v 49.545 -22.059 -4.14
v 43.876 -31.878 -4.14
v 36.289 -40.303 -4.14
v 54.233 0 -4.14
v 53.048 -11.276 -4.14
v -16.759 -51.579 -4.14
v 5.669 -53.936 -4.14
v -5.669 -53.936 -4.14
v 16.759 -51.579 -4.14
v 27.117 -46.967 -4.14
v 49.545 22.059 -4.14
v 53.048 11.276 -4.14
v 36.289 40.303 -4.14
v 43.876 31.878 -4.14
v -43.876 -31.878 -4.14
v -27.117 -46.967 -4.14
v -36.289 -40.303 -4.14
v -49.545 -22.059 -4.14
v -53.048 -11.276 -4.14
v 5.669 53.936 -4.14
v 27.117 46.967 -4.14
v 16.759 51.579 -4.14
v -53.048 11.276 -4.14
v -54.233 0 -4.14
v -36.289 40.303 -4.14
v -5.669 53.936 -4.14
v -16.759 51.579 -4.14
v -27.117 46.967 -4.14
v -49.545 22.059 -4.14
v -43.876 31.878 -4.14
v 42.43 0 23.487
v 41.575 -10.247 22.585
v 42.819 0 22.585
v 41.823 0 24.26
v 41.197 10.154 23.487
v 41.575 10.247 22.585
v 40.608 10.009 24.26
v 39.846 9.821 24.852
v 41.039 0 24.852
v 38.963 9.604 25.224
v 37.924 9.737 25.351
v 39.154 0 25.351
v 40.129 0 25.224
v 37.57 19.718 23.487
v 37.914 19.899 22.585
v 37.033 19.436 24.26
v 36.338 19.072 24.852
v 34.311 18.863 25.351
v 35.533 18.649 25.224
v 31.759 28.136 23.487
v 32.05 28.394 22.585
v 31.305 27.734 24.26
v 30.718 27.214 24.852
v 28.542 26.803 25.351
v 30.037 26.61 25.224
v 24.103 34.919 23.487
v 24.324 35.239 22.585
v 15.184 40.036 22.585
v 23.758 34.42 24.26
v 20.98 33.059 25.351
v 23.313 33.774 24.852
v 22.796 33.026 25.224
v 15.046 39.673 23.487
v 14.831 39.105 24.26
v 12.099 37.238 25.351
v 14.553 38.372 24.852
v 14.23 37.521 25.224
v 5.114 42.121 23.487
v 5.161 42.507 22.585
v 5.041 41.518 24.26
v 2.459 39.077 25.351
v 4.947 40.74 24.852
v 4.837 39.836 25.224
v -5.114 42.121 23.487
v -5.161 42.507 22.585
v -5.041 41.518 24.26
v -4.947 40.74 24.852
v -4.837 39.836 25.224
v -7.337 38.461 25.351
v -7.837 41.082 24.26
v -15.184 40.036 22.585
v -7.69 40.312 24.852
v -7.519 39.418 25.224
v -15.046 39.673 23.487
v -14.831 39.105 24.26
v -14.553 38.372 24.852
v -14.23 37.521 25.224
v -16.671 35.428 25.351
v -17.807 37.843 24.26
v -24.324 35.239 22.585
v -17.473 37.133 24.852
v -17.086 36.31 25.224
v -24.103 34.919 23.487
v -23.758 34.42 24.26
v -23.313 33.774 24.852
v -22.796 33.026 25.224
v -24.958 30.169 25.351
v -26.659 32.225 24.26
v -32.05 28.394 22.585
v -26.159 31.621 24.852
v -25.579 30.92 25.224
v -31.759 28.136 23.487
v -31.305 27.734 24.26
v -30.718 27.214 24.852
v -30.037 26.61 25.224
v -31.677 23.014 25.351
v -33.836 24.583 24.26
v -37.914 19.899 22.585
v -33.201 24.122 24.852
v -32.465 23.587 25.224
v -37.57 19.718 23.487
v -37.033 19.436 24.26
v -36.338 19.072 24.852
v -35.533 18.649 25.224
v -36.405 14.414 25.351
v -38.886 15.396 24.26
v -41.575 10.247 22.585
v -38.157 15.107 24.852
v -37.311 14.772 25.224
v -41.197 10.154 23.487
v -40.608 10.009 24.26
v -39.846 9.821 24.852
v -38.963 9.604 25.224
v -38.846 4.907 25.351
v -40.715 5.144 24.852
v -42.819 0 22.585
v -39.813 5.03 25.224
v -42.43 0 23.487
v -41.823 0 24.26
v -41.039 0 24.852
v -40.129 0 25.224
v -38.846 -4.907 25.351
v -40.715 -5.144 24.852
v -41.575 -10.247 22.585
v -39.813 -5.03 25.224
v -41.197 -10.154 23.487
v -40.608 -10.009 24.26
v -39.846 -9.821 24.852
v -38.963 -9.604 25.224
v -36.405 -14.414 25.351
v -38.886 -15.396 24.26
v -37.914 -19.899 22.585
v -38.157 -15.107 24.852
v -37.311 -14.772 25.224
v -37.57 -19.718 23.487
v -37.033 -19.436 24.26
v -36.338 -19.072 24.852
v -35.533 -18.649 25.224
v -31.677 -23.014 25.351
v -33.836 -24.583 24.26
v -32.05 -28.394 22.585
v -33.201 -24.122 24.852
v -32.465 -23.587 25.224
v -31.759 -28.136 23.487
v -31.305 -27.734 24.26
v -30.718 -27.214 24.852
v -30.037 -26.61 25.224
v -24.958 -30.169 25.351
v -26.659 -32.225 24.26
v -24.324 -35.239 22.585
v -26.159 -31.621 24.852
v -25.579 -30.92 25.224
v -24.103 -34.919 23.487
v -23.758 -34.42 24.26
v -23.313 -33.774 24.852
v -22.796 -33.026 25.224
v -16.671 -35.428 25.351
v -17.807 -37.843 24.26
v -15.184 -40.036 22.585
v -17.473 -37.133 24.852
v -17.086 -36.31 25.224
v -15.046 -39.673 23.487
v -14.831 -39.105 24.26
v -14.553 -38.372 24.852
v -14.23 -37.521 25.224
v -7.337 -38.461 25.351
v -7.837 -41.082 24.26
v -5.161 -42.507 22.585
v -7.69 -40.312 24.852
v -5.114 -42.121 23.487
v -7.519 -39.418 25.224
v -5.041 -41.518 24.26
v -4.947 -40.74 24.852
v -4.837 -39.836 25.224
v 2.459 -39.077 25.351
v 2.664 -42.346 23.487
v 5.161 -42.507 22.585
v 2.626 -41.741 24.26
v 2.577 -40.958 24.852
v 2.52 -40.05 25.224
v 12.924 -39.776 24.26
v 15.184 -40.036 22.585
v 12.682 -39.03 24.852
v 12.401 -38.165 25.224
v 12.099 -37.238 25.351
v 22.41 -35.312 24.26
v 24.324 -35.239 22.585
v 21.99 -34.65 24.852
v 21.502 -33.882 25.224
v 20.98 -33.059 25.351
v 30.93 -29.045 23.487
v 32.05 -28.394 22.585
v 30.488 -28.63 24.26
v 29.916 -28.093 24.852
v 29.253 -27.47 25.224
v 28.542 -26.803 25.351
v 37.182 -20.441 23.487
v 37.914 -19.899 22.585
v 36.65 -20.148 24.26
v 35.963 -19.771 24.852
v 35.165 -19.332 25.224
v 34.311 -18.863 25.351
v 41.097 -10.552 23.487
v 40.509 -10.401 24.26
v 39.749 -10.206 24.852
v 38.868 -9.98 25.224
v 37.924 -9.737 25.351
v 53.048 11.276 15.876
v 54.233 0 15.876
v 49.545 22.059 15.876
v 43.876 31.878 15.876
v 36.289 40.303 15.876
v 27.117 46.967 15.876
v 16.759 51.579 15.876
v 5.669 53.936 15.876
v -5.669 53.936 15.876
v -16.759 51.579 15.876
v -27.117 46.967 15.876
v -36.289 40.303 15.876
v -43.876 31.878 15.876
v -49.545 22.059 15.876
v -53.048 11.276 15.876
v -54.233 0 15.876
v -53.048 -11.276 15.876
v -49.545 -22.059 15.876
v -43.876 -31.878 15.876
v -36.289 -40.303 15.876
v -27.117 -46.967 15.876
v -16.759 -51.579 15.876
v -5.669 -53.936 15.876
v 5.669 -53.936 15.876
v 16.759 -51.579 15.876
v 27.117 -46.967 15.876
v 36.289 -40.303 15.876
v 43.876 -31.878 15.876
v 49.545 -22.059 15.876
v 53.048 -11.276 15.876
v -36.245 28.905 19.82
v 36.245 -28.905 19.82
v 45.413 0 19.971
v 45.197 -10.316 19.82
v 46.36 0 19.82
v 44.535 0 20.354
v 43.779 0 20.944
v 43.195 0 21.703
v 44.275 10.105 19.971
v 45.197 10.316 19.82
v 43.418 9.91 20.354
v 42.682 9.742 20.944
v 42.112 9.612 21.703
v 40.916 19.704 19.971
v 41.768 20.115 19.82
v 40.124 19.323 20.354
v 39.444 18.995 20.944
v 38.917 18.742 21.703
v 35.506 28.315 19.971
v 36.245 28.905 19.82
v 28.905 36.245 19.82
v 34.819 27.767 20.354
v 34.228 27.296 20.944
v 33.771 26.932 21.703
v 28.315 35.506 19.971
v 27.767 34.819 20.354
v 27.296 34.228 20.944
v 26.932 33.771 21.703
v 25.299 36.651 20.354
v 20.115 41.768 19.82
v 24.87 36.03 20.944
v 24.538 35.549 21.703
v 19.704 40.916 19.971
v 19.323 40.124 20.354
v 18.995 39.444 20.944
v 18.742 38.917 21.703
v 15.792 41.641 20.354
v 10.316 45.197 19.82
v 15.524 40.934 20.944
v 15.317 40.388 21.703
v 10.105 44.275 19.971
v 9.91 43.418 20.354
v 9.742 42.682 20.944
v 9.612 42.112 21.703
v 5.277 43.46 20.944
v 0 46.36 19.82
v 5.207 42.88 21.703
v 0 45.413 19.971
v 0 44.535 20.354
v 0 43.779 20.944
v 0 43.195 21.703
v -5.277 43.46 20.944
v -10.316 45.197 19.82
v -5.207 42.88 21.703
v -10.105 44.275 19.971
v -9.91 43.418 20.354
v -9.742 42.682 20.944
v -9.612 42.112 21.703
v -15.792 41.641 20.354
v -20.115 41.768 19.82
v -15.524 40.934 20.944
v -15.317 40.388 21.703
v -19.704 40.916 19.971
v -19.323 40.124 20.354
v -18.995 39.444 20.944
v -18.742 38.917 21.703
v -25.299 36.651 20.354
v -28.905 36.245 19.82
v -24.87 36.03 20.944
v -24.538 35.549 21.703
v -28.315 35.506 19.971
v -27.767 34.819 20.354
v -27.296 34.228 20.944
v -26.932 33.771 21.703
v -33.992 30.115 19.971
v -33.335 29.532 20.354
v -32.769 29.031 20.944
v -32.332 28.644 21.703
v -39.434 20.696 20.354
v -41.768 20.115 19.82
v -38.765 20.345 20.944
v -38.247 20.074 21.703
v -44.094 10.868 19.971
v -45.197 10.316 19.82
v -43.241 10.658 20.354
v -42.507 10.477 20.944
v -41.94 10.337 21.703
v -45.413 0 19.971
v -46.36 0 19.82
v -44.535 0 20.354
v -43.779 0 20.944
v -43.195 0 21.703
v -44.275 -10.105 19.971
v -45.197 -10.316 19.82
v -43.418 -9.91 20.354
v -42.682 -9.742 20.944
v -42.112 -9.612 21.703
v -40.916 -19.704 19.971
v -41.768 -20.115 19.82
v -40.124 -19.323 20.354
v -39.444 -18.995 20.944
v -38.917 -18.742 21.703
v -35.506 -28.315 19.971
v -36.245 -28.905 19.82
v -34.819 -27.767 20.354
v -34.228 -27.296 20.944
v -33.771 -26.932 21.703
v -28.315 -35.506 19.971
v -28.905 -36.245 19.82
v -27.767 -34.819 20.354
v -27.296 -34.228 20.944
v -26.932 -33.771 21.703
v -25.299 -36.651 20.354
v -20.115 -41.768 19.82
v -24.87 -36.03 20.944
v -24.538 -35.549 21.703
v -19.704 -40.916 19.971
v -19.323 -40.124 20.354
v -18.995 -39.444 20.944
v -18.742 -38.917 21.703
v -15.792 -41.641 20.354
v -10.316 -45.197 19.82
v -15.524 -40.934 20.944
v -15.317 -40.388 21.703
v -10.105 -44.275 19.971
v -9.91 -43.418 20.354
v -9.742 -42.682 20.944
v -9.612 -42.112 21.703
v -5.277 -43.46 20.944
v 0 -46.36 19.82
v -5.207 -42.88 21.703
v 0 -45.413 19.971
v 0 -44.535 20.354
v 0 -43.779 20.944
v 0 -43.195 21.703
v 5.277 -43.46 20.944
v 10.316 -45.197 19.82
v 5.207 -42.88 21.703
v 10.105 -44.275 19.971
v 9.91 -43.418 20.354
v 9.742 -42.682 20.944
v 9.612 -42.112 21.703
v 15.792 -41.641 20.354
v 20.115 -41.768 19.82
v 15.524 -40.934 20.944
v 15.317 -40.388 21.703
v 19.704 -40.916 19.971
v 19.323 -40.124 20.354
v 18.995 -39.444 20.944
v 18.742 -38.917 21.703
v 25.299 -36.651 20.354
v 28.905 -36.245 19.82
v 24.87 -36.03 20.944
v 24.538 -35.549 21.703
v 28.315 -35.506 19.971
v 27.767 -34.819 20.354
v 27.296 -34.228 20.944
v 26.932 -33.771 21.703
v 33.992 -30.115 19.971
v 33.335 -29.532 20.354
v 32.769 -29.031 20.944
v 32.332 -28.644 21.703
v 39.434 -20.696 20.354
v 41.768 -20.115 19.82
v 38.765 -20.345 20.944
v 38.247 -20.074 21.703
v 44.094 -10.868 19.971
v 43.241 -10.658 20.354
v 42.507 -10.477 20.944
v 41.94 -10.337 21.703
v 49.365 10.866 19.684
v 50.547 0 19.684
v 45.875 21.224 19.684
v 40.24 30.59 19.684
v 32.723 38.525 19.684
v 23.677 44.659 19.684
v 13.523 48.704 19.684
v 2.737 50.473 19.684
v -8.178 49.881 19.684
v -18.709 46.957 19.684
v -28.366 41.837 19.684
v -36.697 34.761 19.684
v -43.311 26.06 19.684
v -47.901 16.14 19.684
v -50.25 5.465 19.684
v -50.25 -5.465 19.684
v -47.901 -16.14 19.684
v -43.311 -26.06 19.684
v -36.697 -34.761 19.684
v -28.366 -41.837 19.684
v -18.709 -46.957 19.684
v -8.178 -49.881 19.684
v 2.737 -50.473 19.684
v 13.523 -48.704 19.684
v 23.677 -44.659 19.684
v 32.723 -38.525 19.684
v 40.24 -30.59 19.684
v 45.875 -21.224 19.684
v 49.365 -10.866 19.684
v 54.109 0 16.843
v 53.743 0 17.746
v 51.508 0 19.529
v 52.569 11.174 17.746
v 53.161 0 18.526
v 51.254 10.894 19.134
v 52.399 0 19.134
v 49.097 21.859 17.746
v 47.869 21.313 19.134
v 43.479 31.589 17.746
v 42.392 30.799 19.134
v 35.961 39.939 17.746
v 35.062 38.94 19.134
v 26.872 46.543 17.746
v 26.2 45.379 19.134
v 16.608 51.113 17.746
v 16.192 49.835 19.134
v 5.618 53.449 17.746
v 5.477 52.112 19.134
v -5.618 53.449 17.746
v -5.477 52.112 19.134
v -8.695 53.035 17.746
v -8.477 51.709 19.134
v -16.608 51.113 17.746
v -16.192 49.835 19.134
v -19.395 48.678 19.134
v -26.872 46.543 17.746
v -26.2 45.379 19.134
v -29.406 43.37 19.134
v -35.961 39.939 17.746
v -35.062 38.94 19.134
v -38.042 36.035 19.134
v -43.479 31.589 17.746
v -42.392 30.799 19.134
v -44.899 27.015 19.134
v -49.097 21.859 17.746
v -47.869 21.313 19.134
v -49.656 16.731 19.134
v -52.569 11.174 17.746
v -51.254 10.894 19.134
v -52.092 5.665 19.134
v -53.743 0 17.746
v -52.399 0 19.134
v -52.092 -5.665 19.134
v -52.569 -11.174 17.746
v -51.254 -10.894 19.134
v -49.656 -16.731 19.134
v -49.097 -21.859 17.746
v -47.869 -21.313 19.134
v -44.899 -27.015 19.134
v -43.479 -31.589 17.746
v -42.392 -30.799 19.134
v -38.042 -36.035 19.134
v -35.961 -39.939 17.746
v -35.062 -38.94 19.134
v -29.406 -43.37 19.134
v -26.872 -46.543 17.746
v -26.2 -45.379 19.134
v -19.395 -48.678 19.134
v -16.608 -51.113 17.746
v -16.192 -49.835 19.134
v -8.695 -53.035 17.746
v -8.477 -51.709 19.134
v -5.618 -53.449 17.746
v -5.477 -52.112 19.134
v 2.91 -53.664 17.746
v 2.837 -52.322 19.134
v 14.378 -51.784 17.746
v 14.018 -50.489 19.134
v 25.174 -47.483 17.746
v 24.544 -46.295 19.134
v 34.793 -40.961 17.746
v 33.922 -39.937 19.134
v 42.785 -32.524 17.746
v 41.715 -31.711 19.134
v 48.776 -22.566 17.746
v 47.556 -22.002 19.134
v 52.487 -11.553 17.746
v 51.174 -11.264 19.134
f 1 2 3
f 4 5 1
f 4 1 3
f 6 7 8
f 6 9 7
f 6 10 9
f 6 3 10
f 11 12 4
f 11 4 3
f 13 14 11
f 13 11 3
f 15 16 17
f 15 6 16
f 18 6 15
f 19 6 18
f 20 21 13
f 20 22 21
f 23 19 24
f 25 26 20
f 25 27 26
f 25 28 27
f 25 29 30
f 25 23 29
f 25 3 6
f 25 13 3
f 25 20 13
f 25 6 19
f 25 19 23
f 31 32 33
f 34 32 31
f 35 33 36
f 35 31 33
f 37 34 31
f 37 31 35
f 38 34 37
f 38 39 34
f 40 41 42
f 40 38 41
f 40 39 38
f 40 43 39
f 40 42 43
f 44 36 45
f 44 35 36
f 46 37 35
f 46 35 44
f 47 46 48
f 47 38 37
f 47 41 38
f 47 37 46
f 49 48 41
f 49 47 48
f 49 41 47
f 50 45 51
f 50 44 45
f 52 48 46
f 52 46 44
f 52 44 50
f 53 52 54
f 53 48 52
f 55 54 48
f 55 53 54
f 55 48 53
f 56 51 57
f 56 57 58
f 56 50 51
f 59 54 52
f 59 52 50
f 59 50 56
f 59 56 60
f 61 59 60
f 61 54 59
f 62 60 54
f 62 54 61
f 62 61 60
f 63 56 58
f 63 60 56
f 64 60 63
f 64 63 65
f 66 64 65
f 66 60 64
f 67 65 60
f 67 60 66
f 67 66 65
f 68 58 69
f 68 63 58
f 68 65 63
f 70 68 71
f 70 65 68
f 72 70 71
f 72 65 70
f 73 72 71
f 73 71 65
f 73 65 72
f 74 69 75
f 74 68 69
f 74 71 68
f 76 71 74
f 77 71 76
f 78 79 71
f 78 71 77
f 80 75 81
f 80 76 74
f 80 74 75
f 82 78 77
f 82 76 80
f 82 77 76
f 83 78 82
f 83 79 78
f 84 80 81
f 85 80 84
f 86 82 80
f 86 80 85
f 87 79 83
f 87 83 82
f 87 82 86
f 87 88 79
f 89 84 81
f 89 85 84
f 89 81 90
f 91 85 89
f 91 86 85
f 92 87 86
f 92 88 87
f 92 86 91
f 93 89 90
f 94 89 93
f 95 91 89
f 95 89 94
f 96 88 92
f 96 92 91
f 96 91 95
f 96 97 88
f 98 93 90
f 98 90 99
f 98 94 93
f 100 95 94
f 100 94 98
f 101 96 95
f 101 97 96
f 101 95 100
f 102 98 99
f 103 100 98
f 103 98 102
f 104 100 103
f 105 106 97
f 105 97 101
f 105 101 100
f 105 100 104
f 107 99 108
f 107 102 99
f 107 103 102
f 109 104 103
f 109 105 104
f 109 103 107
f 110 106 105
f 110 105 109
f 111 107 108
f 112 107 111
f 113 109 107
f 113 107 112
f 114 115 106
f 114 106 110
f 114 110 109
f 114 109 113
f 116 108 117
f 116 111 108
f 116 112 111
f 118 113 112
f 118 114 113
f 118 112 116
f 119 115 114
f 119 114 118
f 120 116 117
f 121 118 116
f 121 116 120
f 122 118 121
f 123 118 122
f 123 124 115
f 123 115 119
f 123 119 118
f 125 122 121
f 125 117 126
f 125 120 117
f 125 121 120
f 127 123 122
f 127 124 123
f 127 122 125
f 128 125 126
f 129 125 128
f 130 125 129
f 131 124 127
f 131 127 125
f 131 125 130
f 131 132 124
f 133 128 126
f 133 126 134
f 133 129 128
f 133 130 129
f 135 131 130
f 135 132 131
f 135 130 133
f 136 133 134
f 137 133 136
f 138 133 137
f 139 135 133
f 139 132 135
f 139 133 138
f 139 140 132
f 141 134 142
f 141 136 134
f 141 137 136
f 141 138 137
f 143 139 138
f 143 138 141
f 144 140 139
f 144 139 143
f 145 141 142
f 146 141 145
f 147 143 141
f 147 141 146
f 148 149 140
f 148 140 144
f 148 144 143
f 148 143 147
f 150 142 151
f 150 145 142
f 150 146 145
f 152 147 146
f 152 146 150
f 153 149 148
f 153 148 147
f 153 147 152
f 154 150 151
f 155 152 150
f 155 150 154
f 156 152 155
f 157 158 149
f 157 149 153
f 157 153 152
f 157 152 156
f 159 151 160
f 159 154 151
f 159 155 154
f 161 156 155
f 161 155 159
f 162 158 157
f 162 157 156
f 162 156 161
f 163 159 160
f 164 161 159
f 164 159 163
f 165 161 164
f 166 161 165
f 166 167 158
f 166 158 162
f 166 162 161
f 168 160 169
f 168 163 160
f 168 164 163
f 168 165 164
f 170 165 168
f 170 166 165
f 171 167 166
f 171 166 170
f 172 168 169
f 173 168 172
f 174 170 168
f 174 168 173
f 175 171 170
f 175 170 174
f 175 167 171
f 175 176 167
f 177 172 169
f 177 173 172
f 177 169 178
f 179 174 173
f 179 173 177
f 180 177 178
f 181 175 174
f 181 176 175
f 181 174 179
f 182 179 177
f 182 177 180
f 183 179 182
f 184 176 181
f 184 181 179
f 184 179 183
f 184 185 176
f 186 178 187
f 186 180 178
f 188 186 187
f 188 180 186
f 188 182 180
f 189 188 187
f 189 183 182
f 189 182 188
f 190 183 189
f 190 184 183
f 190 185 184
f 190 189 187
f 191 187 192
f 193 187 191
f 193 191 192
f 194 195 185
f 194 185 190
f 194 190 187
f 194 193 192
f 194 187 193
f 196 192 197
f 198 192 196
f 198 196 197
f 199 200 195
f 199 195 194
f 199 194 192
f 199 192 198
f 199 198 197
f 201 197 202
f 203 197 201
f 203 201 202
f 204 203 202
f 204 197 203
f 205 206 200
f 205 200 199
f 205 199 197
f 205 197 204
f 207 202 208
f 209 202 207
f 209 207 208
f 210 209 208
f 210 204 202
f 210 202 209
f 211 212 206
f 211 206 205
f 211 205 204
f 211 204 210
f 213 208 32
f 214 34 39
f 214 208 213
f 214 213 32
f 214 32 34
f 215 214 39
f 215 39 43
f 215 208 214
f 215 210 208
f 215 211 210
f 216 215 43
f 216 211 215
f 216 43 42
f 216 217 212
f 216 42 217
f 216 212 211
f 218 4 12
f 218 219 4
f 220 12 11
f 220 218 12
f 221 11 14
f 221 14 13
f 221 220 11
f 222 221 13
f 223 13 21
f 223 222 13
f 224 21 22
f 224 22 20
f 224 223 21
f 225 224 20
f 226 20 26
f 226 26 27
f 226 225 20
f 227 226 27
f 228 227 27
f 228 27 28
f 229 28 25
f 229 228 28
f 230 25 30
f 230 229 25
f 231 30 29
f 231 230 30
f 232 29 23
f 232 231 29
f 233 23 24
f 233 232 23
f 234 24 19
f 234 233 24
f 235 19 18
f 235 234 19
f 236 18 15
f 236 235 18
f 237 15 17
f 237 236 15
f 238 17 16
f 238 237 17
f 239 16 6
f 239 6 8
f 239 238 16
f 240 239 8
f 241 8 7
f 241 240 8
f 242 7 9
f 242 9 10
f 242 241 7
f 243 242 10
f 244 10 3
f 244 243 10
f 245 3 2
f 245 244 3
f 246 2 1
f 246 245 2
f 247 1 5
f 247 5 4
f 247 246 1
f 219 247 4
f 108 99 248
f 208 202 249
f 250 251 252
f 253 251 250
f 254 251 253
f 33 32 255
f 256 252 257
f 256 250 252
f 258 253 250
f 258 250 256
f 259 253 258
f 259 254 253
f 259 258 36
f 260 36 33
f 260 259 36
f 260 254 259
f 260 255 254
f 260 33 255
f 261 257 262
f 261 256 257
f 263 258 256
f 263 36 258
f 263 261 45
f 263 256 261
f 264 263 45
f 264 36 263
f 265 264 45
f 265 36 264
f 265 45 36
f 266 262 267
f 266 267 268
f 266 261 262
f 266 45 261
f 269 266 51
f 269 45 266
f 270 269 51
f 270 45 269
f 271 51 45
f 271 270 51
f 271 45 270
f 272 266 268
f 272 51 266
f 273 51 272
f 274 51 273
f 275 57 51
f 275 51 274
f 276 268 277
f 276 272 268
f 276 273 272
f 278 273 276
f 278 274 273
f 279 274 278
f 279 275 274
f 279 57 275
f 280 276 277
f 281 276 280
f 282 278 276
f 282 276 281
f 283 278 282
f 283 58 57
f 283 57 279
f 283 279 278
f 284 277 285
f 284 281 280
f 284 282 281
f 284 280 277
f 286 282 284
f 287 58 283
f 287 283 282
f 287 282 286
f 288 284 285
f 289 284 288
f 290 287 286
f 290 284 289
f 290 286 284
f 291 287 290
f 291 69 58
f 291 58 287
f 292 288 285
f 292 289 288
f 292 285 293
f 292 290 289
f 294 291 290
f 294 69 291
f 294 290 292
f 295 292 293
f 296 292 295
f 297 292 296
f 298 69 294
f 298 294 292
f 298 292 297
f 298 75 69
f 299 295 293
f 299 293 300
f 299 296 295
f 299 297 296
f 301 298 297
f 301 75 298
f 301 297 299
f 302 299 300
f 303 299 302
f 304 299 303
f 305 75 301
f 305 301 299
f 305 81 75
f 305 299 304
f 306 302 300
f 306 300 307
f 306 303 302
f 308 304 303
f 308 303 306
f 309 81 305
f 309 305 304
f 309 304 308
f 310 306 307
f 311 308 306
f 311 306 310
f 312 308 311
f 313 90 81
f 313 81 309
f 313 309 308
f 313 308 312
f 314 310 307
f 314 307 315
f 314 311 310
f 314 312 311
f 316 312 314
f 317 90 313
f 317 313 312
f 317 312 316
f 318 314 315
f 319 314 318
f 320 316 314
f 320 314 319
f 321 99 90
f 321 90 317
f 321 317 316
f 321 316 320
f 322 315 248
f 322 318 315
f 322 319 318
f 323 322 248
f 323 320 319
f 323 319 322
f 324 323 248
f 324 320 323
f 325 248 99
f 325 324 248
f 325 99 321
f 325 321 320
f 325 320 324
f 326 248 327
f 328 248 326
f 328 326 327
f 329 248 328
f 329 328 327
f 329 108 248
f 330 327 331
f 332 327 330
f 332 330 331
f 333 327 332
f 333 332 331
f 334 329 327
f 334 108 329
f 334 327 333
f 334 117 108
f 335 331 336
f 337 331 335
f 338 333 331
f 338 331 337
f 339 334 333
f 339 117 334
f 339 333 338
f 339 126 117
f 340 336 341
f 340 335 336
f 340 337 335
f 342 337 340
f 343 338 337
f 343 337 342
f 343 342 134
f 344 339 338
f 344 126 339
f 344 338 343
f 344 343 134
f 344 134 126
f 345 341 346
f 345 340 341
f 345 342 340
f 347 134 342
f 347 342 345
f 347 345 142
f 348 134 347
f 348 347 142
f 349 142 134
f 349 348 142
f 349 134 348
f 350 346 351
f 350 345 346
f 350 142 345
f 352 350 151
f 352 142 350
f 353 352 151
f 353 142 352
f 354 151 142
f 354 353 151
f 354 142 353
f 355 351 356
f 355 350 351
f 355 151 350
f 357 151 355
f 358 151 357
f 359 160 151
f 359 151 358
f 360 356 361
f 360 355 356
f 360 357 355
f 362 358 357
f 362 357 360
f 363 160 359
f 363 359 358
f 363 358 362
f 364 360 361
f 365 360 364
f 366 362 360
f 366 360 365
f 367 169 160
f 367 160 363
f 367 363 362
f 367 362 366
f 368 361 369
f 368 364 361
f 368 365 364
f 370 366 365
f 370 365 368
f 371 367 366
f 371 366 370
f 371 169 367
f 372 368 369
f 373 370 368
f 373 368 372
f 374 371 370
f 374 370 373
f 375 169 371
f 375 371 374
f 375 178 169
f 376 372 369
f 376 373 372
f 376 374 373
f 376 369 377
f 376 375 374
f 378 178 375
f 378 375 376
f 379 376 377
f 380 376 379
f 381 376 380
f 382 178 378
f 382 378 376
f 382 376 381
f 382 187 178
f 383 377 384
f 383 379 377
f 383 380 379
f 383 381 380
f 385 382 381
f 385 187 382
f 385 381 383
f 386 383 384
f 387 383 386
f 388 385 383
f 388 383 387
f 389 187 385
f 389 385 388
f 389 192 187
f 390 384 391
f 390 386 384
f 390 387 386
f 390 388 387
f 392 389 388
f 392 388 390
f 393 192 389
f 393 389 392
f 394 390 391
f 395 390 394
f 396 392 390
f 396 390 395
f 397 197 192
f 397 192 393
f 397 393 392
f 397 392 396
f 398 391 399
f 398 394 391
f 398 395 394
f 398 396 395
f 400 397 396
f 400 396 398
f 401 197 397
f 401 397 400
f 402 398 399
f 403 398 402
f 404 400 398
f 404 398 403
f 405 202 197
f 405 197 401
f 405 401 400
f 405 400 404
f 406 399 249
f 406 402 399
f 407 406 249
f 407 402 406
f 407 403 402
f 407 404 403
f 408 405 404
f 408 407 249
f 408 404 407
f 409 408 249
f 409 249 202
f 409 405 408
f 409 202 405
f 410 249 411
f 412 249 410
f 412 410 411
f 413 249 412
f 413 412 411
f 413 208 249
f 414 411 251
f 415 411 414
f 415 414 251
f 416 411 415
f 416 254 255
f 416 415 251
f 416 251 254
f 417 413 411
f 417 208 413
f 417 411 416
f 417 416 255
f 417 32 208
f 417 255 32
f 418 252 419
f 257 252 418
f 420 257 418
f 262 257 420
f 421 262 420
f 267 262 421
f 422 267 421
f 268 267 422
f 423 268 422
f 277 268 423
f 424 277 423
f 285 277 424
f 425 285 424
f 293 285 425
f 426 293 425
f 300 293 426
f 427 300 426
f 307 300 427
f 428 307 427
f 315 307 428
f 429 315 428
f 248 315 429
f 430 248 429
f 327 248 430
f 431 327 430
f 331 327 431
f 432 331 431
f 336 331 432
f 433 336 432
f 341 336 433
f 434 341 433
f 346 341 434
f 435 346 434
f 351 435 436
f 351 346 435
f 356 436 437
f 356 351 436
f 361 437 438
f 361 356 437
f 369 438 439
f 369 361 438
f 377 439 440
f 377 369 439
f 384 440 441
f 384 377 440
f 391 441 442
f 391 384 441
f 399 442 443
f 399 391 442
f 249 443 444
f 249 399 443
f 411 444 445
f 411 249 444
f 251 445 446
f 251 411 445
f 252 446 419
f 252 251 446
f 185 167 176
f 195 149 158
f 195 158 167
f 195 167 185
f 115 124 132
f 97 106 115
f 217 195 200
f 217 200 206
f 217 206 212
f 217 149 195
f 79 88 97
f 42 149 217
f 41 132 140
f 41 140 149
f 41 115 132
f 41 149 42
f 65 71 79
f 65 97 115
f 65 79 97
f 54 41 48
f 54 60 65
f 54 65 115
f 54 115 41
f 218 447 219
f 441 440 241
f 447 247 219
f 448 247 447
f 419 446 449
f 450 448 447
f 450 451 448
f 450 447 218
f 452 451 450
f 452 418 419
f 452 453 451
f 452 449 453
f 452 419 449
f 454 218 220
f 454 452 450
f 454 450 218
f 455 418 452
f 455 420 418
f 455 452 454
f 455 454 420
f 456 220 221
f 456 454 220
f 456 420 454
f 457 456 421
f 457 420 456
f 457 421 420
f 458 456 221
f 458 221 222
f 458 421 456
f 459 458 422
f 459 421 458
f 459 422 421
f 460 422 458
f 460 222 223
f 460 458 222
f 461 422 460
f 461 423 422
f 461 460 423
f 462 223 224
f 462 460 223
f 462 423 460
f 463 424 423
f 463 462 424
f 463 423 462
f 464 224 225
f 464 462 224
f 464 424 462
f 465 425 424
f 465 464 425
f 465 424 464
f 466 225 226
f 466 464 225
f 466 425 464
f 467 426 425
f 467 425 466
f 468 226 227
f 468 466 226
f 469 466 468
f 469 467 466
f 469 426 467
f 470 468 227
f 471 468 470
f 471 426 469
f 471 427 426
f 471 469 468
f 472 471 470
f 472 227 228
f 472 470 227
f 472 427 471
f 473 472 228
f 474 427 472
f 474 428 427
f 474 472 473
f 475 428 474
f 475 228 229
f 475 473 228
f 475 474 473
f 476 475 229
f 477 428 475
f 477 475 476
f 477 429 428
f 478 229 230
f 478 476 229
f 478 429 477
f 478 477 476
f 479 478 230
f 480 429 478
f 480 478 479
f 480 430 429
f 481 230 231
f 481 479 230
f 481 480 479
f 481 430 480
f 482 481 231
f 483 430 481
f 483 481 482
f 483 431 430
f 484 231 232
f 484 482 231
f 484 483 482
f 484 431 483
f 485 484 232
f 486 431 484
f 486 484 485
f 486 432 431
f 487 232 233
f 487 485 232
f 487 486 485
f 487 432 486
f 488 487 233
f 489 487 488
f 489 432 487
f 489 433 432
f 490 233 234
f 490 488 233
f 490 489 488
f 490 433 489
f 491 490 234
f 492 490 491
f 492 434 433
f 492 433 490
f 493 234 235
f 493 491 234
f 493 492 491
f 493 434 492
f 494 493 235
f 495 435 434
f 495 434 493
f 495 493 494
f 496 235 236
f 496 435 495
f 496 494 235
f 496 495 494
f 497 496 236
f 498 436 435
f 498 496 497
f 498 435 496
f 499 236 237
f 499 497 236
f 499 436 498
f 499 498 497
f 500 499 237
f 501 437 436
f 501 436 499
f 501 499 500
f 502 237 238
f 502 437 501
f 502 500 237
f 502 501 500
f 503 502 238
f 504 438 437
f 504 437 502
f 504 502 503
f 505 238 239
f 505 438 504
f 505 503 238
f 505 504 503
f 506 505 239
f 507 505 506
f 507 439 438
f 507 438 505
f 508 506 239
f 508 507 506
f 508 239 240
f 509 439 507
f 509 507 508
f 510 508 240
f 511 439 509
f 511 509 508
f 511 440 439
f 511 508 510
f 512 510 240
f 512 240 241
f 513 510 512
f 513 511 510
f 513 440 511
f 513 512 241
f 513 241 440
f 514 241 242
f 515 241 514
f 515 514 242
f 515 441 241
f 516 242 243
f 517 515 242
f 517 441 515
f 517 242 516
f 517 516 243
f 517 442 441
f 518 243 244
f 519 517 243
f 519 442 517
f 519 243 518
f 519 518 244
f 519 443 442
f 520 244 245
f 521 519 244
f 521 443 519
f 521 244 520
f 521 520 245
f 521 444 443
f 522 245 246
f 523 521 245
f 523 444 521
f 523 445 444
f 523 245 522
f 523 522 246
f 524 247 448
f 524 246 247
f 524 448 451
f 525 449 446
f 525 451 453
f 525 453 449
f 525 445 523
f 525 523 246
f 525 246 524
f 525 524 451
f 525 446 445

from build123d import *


with BuildPart() as f1:
    # F0 (on Front) → F1 (revolve)
    with BuildSketch(Plane.XZ):
        with BuildLine():
            Line((0, 25.350947), (0, 0))
            Line((0, 0), (0, -4.13963))
            Line((0, -4.13963), (54.233268, -4.13963))
            Line((54.233268, -4.13963), (54.233268, 15.87638))
            ThreePointArc((54.233268, 15.87638), (53.160671, 18.526423), (50.546798, 19.684377))
            Line((50.546798, 19.684377), (46.35951, 19.820212))
            ThreePointArc((46.35951, 19.820212), (44.138408, 20.625078), (42.818762, 22.584578))
            ThreePointArc((42.818762, 22.584578), (41.450118, 24.581698), (39.154484, 25.350947))
            Line((39.154484, 25.350947), (0, 25.350947))
        make_face()
    revolve(axis=Axis((0, 0, 12.675473), (0, 0, 1)))


solid = f1.part
